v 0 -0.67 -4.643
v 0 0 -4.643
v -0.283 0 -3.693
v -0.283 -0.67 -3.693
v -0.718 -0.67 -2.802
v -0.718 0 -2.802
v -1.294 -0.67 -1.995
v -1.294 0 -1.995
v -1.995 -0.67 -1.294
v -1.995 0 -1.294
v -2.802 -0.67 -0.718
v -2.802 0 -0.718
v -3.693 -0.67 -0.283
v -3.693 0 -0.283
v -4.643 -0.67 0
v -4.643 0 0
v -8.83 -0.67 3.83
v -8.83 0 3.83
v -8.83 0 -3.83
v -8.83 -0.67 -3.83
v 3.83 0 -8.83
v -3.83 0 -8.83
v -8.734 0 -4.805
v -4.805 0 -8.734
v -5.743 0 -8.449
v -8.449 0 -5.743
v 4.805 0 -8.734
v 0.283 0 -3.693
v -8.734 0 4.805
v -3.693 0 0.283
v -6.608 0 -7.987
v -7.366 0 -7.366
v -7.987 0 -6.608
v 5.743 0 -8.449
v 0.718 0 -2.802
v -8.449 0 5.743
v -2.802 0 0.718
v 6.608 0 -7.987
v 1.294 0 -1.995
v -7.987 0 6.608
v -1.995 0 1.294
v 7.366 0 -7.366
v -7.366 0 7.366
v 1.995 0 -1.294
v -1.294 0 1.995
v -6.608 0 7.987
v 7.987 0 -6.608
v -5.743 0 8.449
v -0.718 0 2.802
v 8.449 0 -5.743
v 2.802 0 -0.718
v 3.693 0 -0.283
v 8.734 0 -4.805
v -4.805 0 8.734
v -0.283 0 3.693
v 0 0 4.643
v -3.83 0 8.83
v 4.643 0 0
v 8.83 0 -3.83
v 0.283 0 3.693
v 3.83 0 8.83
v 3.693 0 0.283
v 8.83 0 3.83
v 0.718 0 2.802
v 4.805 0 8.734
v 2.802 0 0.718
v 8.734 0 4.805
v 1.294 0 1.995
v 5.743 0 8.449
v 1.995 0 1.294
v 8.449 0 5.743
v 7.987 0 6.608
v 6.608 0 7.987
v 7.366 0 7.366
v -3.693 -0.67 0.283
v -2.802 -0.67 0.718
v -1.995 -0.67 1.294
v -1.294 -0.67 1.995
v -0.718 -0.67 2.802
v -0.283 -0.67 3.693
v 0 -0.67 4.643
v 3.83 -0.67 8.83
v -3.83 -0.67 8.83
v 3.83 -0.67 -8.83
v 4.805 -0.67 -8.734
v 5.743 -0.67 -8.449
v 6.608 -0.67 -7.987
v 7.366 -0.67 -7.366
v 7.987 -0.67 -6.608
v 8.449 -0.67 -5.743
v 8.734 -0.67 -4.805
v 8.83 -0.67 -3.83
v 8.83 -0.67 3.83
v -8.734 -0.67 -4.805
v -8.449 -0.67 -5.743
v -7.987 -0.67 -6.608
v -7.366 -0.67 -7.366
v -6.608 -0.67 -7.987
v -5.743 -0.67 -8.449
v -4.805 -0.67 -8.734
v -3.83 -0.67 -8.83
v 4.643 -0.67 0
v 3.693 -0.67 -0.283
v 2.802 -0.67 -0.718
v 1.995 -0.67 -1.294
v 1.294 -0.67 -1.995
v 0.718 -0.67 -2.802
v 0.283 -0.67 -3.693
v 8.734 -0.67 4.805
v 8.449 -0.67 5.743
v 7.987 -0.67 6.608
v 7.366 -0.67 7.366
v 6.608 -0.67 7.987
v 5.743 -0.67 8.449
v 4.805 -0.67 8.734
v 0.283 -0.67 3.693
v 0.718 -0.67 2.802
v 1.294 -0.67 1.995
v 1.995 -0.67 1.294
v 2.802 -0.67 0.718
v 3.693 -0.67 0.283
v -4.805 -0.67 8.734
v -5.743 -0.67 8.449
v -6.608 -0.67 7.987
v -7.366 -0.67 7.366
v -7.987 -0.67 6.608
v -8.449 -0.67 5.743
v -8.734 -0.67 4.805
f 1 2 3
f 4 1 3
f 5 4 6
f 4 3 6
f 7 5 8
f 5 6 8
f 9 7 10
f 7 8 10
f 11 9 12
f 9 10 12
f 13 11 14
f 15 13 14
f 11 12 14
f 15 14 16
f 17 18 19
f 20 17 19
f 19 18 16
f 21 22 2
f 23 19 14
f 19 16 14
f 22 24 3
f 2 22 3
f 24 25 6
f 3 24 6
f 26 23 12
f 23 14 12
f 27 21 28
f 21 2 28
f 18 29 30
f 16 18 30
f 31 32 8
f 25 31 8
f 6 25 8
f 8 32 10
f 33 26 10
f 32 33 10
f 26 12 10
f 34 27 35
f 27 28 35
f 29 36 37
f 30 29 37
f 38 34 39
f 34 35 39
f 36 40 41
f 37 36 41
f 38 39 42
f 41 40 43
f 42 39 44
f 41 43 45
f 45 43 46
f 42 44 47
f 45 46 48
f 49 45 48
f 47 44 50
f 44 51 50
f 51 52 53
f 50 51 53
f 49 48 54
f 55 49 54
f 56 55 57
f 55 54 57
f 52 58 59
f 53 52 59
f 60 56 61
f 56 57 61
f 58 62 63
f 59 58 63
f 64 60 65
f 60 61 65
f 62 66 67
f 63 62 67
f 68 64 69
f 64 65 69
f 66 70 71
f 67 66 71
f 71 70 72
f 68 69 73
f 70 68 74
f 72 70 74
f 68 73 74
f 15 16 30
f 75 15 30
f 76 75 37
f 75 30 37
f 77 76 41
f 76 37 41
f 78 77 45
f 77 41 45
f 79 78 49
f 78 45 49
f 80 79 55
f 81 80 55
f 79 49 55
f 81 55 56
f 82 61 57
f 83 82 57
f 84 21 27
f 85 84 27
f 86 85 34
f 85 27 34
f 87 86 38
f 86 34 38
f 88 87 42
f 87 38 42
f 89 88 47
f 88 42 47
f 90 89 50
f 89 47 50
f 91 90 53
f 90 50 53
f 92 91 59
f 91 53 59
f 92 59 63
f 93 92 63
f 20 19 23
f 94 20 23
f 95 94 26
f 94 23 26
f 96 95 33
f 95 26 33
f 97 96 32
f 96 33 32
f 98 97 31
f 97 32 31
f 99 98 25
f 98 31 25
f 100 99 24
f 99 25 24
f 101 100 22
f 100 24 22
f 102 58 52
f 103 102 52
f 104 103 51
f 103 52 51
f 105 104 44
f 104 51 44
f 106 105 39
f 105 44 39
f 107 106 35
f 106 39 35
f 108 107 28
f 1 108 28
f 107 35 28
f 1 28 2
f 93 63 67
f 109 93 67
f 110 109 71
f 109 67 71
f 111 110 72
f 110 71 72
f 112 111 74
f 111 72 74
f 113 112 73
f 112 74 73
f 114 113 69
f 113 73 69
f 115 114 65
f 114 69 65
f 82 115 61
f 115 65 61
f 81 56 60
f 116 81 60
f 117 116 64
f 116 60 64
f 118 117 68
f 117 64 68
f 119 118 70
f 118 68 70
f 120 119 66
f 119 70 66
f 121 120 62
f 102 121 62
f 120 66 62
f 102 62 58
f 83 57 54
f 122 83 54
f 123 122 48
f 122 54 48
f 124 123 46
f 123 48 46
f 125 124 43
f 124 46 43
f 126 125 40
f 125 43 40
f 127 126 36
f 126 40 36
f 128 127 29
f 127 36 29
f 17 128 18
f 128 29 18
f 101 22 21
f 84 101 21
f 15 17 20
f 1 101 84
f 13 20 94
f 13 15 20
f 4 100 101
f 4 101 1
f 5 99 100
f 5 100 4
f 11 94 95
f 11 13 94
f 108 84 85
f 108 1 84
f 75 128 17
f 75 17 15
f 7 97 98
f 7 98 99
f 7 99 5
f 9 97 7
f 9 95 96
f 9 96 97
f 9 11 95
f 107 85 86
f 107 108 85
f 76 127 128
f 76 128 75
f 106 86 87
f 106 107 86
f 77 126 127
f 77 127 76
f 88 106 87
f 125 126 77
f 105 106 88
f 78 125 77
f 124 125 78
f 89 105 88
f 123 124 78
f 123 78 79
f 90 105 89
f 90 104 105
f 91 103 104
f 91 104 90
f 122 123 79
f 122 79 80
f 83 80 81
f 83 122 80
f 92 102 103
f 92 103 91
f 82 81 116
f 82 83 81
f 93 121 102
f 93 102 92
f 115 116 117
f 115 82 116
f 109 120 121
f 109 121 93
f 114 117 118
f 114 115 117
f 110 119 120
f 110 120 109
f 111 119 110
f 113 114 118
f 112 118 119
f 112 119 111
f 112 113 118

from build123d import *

# Parameters (mm, degrees)
F1_DEPTH = 0.67


with BuildPart() as f1:
    # F0 (on Front) → F1 (new body)
    with BuildSketch(Plane.XZ):
        with BuildLine():
            Line((3.83, 8.83), (-3.83, 8.83))
            ThreePointArc((-3.83, 8.83), (-7.365534, 7.365534), (-8.83, 3.83))
            Line((-8.83, 3.83), (-8.83, -3.83))
            ThreePointArc((-8.83, -3.83), (-7.365534, -7.365534), (-3.83, -8.83))
            Line((-3.83, -8.83), (3.83, -8.83))
            ThreePointArc((3.83, -8.83), (7.365534, -7.365534), (8.83, -3.83))
            Line((8.83, -3.83), (8.83, 3.83))
            ThreePointArc((8.83, 3.83), (7.365534, 7.365534), (3.83, 8.83))
        make_face()
        with BuildLine():
            ThreePointArc((4.643209, 0), (1.630041, -1.630041), (0, -4.643209))
            ThreePointArc((0, -4.643209), (-1.630041, -1.630041), (-4.643209, 0))
            ThreePointArc((-4.643209, 0), (-1.630041, 1.630041), (0, 4.643209))
            ThreePointArc((0, 4.643209), (1.630041, 1.630041), (4.643209, 0))
        make_face(mode=Mode.SUBTRACT)
    extrude(amount=F1_DEPTH)


solid = f1.part
